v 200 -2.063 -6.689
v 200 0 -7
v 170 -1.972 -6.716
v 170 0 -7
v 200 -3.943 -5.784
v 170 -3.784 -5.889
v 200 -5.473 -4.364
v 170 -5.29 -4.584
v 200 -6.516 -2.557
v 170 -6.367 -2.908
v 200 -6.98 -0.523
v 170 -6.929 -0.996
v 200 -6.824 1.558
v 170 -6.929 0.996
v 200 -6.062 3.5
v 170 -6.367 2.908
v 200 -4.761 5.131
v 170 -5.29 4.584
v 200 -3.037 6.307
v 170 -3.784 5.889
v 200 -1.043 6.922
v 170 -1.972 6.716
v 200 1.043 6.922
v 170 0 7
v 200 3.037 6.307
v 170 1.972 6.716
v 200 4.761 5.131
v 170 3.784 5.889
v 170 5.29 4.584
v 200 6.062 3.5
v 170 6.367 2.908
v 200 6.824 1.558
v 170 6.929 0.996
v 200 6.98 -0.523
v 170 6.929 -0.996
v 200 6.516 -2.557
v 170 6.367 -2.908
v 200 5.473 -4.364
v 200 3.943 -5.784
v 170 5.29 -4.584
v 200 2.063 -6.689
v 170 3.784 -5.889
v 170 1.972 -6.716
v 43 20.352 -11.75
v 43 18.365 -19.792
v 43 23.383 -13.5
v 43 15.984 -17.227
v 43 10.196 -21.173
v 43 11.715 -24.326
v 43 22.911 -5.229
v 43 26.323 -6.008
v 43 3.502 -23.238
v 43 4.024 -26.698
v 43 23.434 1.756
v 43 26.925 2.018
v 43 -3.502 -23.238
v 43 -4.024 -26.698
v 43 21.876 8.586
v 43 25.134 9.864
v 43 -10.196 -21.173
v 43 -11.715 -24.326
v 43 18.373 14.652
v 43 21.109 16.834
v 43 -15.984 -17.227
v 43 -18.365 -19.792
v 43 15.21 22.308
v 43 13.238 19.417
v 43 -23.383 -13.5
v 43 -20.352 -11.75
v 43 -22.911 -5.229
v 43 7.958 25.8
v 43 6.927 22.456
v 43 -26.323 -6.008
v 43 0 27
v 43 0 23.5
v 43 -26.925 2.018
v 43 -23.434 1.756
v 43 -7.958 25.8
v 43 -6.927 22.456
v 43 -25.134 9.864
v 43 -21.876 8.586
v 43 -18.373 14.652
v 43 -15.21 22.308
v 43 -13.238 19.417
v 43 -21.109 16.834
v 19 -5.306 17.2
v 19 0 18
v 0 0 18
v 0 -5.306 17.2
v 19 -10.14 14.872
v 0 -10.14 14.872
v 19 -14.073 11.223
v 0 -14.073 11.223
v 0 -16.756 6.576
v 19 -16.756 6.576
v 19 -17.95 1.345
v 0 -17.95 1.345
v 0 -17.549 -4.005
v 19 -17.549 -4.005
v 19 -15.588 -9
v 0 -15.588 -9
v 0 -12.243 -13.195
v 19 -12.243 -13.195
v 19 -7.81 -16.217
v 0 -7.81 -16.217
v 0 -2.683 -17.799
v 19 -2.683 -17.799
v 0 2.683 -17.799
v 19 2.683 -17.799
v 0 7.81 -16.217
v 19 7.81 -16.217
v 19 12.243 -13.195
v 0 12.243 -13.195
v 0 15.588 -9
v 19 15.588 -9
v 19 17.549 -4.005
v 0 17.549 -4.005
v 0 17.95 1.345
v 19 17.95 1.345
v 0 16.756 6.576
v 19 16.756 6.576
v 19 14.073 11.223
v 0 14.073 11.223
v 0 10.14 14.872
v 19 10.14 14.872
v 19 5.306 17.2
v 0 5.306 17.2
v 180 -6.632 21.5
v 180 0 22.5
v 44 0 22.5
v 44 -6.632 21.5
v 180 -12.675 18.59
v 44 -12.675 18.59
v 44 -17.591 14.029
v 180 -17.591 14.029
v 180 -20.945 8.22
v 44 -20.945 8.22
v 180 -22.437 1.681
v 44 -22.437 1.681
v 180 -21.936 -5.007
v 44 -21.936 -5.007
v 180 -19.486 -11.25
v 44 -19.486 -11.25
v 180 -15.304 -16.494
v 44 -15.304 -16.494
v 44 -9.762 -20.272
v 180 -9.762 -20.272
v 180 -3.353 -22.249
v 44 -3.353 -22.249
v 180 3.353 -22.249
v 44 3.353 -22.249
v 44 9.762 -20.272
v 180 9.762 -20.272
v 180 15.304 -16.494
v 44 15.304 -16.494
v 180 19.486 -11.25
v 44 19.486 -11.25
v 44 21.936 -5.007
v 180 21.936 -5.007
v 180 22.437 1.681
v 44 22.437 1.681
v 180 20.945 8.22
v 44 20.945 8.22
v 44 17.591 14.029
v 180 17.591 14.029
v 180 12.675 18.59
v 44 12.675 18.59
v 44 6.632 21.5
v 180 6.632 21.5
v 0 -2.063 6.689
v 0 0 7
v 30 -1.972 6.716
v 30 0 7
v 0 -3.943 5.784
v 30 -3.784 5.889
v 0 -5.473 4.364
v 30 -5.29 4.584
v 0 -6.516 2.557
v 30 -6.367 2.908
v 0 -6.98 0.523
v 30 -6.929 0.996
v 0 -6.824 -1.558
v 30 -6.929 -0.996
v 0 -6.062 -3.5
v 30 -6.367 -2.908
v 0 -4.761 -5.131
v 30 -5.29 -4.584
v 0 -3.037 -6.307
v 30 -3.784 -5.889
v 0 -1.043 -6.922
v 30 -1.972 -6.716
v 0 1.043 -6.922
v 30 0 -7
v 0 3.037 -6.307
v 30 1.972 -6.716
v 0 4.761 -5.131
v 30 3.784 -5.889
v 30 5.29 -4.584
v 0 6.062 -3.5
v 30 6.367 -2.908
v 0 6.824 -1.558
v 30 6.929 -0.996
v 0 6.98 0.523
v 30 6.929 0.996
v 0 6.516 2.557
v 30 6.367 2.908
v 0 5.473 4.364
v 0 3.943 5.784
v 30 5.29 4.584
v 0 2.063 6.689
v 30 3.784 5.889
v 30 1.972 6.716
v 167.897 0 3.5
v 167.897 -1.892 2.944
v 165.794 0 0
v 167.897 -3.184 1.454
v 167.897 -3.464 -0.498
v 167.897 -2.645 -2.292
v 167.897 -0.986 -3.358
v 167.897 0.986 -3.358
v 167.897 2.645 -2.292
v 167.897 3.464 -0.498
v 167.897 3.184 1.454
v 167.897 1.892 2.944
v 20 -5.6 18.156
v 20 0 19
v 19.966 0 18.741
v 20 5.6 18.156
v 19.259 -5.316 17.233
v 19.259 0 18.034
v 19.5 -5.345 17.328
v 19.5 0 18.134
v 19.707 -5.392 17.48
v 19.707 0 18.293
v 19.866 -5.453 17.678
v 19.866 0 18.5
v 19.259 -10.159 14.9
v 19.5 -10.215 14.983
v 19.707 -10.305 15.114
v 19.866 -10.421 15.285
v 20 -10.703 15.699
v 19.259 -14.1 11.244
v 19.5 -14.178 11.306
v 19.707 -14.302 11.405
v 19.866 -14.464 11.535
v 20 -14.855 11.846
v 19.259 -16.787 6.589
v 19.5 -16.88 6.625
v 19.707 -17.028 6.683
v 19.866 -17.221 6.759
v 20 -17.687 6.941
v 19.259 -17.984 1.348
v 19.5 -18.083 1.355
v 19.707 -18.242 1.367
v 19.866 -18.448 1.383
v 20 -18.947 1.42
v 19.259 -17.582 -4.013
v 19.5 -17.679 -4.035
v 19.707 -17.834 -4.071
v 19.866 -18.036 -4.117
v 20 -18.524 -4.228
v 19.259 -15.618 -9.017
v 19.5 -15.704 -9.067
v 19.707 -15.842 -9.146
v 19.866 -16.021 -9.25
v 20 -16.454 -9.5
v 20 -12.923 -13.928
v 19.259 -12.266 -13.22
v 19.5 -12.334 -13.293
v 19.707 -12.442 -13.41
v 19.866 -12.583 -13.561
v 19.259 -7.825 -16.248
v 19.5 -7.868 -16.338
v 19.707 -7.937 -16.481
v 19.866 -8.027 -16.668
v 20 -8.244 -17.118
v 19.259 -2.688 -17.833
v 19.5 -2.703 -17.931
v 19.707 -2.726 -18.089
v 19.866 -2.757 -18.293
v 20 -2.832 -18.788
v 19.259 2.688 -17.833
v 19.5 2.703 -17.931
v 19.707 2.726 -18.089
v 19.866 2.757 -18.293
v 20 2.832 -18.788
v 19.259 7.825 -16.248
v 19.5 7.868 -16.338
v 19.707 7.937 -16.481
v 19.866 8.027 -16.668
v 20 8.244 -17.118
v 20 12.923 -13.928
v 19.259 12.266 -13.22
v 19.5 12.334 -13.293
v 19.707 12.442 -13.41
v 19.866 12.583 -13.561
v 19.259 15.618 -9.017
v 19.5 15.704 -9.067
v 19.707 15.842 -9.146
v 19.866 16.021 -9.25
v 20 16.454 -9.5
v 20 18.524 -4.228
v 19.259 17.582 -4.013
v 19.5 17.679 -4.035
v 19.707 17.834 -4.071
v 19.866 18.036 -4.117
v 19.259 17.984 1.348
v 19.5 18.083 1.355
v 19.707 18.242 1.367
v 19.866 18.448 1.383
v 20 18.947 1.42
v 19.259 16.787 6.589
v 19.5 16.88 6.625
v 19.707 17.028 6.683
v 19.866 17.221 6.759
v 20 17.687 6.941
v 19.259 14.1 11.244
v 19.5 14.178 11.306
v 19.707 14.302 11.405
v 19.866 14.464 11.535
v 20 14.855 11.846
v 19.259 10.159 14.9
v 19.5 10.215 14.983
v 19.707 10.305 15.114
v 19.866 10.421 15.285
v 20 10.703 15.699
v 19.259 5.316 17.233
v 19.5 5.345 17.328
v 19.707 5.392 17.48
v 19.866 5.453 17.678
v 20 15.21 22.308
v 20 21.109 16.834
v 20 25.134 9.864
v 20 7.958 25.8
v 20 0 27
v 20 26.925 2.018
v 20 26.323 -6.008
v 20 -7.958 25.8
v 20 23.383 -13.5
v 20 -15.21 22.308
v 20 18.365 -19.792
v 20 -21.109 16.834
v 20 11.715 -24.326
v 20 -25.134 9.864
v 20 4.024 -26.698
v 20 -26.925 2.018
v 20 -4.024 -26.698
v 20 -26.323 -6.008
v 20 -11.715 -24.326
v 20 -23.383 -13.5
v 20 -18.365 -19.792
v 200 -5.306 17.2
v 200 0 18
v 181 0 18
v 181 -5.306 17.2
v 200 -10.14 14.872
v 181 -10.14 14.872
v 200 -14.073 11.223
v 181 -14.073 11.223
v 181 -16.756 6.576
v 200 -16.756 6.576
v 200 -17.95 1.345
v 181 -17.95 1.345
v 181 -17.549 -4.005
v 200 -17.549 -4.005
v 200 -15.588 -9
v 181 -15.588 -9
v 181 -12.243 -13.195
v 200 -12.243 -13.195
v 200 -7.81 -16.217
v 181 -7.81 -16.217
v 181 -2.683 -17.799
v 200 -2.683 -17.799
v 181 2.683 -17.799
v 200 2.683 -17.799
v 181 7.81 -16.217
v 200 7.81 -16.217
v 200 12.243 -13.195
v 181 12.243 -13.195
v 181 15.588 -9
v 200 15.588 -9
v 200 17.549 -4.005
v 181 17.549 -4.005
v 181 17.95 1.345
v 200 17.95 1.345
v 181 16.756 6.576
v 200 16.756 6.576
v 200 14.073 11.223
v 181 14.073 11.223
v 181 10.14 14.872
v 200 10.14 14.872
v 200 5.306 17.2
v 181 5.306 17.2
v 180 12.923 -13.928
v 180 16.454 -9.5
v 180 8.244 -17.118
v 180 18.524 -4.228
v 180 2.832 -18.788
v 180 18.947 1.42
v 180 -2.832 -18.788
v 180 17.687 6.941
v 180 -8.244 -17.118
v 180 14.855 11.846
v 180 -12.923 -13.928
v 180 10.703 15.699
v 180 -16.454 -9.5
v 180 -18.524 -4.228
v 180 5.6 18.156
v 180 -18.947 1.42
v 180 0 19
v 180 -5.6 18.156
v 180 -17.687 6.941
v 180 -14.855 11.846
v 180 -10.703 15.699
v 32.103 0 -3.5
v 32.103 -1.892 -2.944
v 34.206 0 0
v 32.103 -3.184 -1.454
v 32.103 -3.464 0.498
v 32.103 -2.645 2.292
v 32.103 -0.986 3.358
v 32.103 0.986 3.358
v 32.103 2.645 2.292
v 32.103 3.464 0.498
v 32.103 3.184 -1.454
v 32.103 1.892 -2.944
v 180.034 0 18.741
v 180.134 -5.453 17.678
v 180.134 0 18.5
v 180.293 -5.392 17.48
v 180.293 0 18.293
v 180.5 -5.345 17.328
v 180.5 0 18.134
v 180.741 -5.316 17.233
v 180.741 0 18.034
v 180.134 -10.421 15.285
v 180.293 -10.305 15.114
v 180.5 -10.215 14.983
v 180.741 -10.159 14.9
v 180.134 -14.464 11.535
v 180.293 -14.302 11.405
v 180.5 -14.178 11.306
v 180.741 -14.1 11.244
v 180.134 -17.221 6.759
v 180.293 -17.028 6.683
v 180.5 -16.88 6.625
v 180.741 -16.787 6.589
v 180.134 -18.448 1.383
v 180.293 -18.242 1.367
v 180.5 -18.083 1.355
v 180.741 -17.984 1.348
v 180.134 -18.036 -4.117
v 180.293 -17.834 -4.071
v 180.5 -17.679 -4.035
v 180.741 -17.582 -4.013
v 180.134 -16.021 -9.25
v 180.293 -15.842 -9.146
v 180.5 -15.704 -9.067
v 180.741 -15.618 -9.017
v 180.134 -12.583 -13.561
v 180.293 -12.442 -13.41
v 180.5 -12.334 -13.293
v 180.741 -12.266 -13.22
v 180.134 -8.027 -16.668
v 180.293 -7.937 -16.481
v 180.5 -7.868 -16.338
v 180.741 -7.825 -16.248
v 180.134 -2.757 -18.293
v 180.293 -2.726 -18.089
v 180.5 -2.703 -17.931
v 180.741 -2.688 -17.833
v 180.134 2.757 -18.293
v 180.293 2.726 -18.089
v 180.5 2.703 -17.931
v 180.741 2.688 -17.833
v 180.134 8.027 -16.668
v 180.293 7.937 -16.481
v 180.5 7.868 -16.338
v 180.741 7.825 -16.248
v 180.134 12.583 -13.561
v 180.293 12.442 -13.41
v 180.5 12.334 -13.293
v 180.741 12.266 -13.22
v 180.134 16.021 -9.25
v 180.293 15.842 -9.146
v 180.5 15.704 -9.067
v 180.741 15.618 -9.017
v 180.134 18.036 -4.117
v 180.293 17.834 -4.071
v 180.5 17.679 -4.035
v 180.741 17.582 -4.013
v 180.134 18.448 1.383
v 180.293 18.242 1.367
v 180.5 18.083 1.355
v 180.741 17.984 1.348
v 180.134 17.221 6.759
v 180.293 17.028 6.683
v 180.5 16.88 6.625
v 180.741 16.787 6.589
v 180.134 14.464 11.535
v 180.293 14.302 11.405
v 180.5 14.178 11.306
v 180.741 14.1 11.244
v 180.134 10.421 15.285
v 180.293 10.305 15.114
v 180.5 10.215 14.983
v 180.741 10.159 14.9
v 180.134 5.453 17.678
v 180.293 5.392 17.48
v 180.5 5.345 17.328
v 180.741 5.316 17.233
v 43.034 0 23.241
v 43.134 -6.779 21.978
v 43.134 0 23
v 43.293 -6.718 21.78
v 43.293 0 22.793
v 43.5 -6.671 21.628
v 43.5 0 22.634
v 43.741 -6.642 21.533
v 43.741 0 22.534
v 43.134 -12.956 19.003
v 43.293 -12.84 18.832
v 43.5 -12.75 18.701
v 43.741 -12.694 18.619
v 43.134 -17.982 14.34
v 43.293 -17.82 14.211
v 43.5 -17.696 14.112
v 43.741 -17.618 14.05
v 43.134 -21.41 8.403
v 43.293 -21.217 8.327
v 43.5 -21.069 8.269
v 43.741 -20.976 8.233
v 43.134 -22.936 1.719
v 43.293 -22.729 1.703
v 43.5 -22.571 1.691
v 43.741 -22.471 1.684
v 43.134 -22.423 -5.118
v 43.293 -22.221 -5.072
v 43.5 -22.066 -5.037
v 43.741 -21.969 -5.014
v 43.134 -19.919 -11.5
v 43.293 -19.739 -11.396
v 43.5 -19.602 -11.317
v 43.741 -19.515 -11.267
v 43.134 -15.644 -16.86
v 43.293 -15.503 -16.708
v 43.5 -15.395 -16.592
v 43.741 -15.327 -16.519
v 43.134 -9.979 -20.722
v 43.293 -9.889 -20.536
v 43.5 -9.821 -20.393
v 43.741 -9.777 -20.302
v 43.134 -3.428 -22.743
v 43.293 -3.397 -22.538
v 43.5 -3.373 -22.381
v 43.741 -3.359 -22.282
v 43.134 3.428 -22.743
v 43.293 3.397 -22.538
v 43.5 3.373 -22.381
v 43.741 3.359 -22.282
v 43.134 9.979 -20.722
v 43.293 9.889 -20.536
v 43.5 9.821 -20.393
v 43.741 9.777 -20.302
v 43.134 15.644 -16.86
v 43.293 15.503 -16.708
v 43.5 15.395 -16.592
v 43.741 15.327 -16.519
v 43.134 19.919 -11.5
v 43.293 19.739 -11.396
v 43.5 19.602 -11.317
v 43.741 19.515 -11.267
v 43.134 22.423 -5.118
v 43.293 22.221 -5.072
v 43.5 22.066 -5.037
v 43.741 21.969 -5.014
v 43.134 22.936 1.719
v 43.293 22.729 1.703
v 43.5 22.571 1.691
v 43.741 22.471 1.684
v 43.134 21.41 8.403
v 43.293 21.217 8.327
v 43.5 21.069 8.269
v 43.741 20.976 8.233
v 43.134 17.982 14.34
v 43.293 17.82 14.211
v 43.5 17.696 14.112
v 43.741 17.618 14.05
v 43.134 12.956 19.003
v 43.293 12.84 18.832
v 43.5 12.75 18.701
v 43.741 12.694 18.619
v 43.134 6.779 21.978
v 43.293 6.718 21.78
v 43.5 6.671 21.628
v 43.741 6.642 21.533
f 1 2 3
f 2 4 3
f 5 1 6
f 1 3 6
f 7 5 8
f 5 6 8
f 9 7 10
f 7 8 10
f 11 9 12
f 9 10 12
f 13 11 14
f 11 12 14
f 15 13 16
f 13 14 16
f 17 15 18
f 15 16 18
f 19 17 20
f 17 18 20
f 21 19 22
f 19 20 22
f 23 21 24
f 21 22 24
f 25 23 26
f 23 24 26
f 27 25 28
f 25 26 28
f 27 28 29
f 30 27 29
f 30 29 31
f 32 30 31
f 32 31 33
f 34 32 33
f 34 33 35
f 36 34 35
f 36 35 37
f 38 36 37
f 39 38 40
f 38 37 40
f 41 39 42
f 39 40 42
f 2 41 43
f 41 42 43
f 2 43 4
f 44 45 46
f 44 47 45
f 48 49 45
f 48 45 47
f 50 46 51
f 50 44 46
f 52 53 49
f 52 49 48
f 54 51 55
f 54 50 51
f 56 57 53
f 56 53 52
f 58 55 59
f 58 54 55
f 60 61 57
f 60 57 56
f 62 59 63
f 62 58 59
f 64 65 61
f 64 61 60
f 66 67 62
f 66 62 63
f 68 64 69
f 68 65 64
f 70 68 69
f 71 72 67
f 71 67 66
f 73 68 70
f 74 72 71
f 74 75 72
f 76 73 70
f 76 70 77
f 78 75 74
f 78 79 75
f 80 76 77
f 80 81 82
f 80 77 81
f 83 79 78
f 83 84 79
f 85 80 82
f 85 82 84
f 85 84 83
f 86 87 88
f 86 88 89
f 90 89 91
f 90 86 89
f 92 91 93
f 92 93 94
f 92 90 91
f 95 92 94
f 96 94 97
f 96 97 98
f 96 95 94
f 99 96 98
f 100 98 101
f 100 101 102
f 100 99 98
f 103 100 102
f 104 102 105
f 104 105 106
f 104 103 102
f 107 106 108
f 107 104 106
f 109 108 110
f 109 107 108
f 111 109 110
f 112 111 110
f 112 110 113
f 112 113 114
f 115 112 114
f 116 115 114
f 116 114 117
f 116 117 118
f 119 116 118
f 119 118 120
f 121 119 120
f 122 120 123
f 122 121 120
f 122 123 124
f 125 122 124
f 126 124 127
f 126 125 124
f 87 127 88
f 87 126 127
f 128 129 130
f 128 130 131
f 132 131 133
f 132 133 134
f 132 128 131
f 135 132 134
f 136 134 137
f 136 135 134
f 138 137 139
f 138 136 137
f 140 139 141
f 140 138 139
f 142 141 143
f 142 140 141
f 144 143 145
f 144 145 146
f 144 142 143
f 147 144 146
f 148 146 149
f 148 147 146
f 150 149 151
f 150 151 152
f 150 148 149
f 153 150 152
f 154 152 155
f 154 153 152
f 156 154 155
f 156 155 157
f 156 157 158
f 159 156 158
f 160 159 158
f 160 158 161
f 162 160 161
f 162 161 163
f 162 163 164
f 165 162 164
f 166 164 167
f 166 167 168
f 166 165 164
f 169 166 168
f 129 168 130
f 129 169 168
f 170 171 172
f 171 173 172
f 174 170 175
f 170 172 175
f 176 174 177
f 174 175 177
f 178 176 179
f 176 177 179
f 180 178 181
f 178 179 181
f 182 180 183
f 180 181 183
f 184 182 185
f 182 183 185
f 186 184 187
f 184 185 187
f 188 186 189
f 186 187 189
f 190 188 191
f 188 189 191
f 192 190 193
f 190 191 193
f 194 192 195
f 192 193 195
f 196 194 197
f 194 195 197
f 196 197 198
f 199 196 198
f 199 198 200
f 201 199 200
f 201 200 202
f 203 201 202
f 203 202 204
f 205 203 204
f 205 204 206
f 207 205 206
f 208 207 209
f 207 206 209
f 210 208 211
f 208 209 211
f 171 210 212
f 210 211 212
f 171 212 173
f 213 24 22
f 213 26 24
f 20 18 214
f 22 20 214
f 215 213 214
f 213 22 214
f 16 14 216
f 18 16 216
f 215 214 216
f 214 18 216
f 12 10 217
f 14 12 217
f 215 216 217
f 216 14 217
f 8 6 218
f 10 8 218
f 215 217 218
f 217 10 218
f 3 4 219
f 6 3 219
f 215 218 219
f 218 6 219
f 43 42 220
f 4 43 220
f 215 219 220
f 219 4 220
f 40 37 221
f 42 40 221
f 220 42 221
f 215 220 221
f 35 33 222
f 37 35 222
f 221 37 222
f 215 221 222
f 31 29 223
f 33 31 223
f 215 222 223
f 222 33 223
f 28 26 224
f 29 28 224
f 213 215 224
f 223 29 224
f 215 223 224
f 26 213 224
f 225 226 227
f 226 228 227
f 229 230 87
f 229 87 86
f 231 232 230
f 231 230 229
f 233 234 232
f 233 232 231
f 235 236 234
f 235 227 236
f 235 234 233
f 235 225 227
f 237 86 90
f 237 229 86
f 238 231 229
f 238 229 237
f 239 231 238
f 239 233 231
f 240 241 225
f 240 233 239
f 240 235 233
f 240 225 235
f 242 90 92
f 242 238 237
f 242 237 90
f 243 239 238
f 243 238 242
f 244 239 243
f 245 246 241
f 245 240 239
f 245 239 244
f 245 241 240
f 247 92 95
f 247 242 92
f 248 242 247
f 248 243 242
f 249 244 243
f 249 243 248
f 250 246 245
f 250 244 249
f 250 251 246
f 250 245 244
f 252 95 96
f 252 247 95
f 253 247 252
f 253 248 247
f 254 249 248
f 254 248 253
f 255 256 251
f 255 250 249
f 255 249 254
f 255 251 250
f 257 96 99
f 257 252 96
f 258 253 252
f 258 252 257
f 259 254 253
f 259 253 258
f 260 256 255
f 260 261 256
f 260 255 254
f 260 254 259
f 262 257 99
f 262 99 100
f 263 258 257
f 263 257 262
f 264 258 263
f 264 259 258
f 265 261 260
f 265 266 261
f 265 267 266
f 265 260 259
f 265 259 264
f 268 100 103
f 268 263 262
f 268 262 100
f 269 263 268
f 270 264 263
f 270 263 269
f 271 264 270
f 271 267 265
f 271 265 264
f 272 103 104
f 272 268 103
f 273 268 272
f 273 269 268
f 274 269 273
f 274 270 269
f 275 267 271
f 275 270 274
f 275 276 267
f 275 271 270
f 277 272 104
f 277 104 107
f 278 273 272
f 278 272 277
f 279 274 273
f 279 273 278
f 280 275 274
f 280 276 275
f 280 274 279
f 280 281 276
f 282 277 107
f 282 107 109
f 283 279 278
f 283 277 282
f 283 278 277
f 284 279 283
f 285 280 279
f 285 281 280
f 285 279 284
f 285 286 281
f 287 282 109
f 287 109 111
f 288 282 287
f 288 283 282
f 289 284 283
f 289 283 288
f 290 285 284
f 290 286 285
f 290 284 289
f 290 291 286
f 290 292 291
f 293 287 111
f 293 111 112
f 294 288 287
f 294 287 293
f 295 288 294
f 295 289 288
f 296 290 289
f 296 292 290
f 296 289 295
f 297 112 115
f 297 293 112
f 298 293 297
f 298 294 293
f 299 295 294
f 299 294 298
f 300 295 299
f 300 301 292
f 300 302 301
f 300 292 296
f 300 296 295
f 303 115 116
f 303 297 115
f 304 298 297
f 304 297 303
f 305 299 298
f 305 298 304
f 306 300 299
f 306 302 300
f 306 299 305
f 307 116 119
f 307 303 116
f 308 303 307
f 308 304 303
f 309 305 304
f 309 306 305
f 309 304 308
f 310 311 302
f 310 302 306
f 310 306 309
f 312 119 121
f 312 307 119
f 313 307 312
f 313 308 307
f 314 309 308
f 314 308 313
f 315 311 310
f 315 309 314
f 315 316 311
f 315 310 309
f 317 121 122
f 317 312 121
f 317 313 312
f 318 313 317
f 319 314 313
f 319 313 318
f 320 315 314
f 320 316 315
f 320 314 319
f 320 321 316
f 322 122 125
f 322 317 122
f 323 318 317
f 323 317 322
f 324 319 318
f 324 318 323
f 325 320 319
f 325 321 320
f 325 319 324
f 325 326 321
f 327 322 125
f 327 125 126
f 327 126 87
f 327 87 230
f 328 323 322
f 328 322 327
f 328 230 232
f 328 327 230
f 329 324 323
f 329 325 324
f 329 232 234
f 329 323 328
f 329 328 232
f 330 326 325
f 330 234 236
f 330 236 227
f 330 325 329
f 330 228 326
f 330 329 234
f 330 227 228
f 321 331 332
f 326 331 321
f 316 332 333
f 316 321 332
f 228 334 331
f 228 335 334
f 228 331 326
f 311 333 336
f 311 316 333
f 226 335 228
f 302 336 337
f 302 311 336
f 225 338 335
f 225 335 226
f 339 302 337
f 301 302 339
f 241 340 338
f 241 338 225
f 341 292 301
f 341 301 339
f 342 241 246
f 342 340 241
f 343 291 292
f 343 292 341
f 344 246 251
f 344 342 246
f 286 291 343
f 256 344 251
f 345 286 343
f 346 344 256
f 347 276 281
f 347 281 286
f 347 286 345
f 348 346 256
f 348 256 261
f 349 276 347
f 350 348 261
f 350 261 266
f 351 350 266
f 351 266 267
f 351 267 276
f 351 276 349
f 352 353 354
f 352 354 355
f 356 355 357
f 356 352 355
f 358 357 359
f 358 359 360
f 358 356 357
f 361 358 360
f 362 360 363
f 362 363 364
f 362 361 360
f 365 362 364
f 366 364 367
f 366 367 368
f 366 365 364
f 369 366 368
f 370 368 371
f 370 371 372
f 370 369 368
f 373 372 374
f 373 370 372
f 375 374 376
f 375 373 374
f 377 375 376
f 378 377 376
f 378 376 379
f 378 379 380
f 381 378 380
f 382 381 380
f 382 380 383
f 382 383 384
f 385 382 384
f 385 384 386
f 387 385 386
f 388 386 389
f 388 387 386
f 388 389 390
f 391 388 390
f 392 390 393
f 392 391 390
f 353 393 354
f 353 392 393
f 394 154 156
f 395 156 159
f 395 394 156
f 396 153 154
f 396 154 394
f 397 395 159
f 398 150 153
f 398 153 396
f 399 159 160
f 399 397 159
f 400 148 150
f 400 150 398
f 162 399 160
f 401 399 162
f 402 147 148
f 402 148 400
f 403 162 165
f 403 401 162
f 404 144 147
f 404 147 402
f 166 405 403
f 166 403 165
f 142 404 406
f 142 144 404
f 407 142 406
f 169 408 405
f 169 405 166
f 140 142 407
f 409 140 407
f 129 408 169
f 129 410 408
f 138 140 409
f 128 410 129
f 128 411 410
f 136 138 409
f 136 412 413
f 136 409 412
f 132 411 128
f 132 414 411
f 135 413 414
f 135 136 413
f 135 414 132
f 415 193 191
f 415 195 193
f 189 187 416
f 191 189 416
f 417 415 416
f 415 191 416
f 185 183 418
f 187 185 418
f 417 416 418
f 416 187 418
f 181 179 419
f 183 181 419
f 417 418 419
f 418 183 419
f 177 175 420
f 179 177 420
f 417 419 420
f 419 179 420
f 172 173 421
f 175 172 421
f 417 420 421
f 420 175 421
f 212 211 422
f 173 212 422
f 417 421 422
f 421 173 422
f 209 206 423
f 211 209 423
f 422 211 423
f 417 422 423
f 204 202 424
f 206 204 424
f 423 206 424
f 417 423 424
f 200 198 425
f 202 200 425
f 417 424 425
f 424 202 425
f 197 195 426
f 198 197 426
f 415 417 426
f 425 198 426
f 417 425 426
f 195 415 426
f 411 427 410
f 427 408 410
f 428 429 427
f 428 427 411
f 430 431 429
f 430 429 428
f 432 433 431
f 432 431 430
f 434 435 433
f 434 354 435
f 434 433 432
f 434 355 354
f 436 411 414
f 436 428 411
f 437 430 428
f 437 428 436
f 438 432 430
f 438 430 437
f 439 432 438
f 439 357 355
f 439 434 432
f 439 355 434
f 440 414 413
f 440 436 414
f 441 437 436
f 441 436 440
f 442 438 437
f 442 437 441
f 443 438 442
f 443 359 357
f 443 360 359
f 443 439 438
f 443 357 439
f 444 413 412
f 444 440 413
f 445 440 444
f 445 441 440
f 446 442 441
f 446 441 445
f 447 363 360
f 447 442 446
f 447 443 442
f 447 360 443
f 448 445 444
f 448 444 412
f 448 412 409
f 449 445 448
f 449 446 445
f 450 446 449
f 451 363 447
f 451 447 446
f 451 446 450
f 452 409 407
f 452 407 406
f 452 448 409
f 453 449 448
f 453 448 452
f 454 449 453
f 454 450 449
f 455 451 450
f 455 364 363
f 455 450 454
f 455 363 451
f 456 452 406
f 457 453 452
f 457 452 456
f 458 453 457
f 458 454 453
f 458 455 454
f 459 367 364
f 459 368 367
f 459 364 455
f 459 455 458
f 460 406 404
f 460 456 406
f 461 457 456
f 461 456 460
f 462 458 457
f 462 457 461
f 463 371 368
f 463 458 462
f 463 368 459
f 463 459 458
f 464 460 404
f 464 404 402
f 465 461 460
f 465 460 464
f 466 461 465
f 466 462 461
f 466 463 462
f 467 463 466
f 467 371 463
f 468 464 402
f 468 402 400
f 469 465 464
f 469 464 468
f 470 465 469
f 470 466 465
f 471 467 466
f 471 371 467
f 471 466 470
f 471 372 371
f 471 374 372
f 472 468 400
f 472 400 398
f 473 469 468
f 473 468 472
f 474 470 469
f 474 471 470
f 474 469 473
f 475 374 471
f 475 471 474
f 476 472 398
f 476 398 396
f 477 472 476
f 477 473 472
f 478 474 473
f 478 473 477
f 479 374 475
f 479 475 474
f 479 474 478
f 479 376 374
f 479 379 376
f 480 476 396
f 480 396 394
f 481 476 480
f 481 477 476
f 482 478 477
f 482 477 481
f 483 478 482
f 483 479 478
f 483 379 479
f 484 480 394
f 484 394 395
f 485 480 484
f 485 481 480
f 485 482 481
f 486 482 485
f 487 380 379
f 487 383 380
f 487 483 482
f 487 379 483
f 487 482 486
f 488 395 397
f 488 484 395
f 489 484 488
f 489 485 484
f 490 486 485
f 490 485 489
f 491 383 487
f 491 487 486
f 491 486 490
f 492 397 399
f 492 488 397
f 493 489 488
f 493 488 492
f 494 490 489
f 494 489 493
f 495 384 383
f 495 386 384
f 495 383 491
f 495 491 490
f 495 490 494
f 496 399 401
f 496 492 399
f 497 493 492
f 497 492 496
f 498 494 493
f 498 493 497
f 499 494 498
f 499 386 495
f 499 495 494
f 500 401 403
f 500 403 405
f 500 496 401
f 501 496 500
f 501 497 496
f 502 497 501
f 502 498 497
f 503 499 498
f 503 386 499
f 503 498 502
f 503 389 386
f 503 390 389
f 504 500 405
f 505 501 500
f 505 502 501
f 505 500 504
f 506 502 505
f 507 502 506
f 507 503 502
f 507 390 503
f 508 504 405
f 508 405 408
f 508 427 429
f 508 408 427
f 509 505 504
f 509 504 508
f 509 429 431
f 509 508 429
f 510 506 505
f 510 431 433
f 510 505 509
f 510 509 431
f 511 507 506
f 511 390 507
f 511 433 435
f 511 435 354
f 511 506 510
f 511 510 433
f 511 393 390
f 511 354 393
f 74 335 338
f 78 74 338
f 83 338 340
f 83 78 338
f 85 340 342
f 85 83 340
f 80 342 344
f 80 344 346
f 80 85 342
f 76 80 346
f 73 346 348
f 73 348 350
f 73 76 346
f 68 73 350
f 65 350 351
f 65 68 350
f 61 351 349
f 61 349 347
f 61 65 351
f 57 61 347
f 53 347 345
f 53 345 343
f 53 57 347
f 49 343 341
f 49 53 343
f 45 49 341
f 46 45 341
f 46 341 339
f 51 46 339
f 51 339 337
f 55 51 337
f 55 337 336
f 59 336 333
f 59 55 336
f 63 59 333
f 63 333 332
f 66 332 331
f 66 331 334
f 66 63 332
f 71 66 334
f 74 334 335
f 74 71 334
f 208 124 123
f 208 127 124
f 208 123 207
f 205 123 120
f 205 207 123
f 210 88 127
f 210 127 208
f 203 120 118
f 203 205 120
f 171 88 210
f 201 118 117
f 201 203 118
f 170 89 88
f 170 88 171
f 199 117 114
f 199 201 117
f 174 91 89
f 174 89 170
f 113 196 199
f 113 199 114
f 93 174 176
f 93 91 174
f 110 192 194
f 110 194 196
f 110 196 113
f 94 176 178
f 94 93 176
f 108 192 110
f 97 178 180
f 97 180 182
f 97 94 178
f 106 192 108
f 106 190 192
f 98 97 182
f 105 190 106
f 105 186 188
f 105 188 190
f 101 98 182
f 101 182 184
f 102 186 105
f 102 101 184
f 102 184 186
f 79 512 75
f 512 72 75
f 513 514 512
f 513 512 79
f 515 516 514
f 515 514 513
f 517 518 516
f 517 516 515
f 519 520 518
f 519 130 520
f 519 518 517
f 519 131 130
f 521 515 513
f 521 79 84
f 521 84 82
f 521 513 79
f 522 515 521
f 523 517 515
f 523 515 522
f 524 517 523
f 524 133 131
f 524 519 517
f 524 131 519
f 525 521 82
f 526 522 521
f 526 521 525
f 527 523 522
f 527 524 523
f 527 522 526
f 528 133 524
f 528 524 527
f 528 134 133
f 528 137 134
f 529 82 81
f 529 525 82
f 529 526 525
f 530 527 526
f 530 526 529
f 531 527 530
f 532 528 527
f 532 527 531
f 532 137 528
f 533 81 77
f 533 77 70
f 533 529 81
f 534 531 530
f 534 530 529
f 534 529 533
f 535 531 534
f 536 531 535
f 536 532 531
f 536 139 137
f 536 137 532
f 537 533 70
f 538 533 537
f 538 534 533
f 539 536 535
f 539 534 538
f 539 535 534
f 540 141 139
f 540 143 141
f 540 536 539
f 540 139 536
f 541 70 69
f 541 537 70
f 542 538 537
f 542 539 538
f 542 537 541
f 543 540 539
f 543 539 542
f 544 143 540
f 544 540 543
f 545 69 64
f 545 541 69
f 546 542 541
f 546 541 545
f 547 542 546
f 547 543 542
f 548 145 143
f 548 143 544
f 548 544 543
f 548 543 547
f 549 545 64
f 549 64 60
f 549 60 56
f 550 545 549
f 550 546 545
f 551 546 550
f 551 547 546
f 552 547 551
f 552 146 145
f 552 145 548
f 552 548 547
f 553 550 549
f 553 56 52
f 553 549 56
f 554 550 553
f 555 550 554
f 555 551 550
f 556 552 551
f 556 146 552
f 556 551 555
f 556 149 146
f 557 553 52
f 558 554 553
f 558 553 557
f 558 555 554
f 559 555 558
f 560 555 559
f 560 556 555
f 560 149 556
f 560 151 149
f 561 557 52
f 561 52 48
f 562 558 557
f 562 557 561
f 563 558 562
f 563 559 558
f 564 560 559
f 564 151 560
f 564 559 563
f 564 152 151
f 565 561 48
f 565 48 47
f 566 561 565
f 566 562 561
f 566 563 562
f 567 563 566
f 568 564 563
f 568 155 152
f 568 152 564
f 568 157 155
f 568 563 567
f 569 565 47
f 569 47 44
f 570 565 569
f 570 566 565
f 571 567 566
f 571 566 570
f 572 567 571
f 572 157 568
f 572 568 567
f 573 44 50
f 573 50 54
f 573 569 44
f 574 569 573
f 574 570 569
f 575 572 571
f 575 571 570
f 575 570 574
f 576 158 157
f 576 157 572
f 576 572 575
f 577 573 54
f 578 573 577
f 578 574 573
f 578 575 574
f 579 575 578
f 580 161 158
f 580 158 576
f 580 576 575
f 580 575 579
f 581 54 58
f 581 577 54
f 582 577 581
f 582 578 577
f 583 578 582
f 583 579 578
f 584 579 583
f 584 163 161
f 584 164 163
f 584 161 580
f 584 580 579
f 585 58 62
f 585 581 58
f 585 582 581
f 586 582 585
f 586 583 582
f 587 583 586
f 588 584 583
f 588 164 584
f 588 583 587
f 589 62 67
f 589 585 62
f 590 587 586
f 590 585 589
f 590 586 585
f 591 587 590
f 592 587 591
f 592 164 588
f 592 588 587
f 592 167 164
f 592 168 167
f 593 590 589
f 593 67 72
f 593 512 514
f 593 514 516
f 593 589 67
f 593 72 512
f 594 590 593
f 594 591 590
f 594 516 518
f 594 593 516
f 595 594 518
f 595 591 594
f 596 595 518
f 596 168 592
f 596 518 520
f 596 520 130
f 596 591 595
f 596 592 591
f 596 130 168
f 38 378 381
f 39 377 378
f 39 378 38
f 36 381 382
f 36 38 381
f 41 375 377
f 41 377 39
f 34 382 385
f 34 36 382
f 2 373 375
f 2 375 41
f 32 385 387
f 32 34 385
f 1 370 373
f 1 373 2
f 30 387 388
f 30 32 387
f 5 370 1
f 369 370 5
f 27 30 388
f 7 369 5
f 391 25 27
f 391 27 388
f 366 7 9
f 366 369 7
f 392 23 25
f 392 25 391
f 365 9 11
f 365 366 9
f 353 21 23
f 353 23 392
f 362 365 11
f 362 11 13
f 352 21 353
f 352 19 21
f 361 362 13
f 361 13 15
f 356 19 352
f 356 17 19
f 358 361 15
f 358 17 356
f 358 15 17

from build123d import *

# Parameters (mm, degrees)
BROCA_DE_ROSQUEAR_PARA_TARRAXA_DE_M161_D       = 14
BROCA_DE_ROSQUEAR_PARA_TARRAXA_DE_M161_DEPTH   = 30
BROCA_DE_ROSQUEAR_PARA_TARRAXA_DE_M161_TIP     = 4.206024333
BROCA_DE_ROSQUEAR_PARA_TARRAXA_DE_M161_O_D     = 14
BROCA_DE_ROSQUEAR_PARA_TARRAXA_DE_M161_O_DEPTH = 30
BROCA_DE_ROSQUEAR_PARA_TARRAXA_DE_M161_O_TIP   = 4.206024333
FILETE1_R                                      = 1


with BuildPart() as part:
    # Esboço1 → Revolução1 (revolve)
    with BuildSketch(Plane.XY, mode=Mode.PRIVATE) as revolu_o1_sk:
        Polygon((0, 0), (0, 18), (20, 18), (20, 27), (43, 27), (43, 22.5), (180, 22.5), (180, 18), (200, 18), (200, 0), align=None)
    revolve(revolu_o1_sk.sketch.rotate(Axis((0, 0, 0), (1, 0, 0)), 90), axis=Axis((0, 0, 0), (1, 0, 0)))

    # Broca de rosquear para tarraxa de M161
    with Locations(Plane(origin=(200, 0, 0), x_dir=(0, 0, 1), z_dir=(1, 0, 0))):
        with Locations((0, 0)):
            Hole(BROCA_DE_ROSQUEAR_PARA_TARRAXA_DE_M161_D / 2, depth=BROCA_DE_ROSQUEAR_PARA_TARRAXA_DE_M161_DEPTH)
            with Locations((0, 0, -(BROCA_DE_ROSQUEAR_PARA_TARRAXA_DE_M161_DEPTH + BROCA_DE_ROSQUEAR_PARA_TARRAXA_DE_M161_TIP / 2))):  # 118° drill point
                Cone(0, BROCA_DE_ROSQUEAR_PARA_TARRAXA_DE_M161_D / 2, BROCA_DE_ROSQUEAR_PARA_TARRAXA_DE_M161_TIP, mode=Mode.SUBTRACT)

    # Broca de rosquear para tarraxa de M161 o
    with Locations(Plane(origin=(0, 0, 0), x_dir=(0, 0, -1), z_dir=(-1, 0, 0))):
        with Locations((0, 0)):
            Hole(BROCA_DE_ROSQUEAR_PARA_TARRAXA_DE_M161_O_D / 2, depth=BROCA_DE_ROSQUEAR_PARA_TARRAXA_DE_M161_O_DEPTH)
            with Locations((0, 0, -(BROCA_DE_ROSQUEAR_PARA_TARRAXA_DE_M161_O_DEPTH + BROCA_DE_ROSQUEAR_PARA_TARRAXA_DE_M161_O_TIP / 2))):  # 118° drill point
                Cone(0, BROCA_DE_ROSQUEAR_PARA_TARRAXA_DE_M161_O_D / 2, BROCA_DE_ROSQUEAR_PARA_TARRAXA_DE_M161_O_TIP, mode=Mode.SUBTRACT)

    # Filete1
    filete1_edges = [part.edges().sort_by_distance(p)[0] for p in [
        (20, 0, -18),
        (180, 0, -18),
        (43, 0, -22.5),
    ]]
    fillet(filete1_edges, radius=FILETE1_R)


solid = part.part
